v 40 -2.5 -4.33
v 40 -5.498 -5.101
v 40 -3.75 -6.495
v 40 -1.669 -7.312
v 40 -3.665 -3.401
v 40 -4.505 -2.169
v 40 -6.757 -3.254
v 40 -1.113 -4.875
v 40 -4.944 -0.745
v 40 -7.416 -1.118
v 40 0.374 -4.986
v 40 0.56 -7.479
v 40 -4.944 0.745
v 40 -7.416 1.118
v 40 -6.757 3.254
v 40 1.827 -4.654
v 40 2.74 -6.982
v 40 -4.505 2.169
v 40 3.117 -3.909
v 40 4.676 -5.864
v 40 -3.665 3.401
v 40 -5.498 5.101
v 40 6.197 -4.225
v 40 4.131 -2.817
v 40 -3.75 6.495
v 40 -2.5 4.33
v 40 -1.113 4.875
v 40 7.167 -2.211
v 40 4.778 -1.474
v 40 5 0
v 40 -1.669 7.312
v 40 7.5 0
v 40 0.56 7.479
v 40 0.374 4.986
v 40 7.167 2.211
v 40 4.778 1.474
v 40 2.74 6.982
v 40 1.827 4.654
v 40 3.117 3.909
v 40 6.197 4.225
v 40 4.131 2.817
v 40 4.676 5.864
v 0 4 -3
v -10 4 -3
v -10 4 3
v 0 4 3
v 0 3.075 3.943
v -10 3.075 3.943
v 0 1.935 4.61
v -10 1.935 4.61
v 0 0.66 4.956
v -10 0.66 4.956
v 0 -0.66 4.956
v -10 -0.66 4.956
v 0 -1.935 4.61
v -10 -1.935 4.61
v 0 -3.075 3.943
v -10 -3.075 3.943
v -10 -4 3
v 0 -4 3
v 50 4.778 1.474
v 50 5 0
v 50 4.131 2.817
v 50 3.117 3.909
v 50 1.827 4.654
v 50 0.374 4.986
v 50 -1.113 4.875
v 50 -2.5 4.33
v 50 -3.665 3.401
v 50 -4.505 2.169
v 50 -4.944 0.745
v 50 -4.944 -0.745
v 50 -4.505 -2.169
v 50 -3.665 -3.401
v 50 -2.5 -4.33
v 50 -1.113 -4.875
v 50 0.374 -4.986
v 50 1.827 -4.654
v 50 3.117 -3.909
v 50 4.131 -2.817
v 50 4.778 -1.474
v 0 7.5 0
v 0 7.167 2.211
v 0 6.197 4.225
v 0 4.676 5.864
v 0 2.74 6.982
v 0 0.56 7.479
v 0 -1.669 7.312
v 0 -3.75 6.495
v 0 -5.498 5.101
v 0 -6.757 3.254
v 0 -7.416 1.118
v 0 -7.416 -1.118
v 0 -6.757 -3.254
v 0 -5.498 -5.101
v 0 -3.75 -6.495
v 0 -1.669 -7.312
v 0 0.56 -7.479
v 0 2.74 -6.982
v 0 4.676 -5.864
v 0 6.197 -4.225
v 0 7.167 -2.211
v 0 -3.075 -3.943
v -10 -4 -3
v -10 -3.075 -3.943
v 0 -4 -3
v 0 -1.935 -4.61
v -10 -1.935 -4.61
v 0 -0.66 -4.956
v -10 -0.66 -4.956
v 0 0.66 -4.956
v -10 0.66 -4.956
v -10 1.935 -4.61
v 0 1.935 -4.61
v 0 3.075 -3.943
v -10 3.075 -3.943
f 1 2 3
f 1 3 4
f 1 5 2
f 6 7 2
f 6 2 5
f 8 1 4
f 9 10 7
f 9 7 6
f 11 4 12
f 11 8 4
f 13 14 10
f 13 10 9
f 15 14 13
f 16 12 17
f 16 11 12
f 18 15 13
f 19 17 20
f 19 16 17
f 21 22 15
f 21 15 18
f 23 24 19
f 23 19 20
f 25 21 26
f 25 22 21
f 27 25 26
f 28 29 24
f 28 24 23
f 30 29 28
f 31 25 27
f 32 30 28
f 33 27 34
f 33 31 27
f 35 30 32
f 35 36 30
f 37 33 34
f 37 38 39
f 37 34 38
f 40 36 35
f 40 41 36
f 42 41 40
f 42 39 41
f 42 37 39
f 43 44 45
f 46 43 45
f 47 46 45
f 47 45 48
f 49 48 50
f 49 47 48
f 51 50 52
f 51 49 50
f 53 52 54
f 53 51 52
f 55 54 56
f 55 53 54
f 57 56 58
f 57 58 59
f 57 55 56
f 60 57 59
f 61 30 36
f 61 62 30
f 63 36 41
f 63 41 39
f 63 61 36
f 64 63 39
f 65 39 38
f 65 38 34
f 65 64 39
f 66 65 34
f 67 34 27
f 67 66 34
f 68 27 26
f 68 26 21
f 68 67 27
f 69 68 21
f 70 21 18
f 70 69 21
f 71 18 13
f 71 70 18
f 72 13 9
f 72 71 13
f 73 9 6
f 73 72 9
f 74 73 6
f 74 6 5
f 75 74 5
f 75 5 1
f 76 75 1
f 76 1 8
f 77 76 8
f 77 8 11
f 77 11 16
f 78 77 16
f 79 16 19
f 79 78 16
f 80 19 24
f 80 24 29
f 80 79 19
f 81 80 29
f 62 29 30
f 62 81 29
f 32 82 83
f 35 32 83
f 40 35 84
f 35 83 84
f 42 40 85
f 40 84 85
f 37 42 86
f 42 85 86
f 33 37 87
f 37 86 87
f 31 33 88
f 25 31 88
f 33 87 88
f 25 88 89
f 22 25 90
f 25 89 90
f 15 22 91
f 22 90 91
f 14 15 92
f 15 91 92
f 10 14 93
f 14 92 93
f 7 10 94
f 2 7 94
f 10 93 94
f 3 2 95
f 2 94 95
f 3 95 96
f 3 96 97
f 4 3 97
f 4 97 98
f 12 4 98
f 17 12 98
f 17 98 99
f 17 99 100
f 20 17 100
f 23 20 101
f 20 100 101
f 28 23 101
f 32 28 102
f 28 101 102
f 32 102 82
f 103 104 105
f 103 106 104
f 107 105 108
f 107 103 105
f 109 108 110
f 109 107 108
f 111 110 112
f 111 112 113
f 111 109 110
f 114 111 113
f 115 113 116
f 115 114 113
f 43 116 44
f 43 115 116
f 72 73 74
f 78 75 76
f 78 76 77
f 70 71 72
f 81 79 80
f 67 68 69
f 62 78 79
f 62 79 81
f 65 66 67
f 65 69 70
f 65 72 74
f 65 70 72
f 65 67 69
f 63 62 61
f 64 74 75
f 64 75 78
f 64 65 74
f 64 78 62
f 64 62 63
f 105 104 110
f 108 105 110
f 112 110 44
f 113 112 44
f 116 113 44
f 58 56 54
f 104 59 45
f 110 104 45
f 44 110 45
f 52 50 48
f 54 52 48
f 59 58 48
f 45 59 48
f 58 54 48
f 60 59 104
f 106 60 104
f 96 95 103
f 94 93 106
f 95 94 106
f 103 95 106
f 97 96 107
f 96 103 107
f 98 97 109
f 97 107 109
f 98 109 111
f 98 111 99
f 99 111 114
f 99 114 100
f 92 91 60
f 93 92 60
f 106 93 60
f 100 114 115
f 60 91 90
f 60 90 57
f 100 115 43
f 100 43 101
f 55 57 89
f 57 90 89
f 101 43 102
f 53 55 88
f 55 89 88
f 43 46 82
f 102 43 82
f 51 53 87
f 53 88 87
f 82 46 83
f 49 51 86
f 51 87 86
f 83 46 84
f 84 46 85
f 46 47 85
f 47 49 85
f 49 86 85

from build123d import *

# Parameters (mm, degrees)
F0_R          = 5
F1_DEPTH      = 50
F1_DEPTH_BACK = 10
F2_R          = 7.5
F3_DEPTH      = 40
F5_DEPTH      = 10


with BuildPart() as f1:
    # F0 (on Right) → F1 (new body, two sides)
    with BuildSketch(Plane.YZ) as f1_sk:
        Circle(F0_R)
    extrude(amount=F1_DEPTH)
    extrude(f1_sk.sketch, amount=-F1_DEPTH_BACK)

    # F2 (on Right) → F3 (join)
    with BuildSketch(Plane.YZ):
        Circle(F2_R)
    extrude(amount=F3_DEPTH)

    # F4 (on face) → F5 (cut, through all)
    with BuildSketch(Plane(origin=(-10, 0, 0), x_dir=(0, -1, 0), z_dir=(-1, 0, 0))):
        with BuildLine():
            Line((-4, -3), (-4, 3))
            ThreePointArc((-4, 3), (-5, 0), (-4, -3))
        make_face()
        with BuildLine():
            ThreePointArc((4, -3), (5, 0), (4, 3))
            Line((4, 3), (4, -3))
        make_face()
    extrude(amount=-F5_DEPTH, mode=Mode.SUBTRACT)


solid = f1.part
